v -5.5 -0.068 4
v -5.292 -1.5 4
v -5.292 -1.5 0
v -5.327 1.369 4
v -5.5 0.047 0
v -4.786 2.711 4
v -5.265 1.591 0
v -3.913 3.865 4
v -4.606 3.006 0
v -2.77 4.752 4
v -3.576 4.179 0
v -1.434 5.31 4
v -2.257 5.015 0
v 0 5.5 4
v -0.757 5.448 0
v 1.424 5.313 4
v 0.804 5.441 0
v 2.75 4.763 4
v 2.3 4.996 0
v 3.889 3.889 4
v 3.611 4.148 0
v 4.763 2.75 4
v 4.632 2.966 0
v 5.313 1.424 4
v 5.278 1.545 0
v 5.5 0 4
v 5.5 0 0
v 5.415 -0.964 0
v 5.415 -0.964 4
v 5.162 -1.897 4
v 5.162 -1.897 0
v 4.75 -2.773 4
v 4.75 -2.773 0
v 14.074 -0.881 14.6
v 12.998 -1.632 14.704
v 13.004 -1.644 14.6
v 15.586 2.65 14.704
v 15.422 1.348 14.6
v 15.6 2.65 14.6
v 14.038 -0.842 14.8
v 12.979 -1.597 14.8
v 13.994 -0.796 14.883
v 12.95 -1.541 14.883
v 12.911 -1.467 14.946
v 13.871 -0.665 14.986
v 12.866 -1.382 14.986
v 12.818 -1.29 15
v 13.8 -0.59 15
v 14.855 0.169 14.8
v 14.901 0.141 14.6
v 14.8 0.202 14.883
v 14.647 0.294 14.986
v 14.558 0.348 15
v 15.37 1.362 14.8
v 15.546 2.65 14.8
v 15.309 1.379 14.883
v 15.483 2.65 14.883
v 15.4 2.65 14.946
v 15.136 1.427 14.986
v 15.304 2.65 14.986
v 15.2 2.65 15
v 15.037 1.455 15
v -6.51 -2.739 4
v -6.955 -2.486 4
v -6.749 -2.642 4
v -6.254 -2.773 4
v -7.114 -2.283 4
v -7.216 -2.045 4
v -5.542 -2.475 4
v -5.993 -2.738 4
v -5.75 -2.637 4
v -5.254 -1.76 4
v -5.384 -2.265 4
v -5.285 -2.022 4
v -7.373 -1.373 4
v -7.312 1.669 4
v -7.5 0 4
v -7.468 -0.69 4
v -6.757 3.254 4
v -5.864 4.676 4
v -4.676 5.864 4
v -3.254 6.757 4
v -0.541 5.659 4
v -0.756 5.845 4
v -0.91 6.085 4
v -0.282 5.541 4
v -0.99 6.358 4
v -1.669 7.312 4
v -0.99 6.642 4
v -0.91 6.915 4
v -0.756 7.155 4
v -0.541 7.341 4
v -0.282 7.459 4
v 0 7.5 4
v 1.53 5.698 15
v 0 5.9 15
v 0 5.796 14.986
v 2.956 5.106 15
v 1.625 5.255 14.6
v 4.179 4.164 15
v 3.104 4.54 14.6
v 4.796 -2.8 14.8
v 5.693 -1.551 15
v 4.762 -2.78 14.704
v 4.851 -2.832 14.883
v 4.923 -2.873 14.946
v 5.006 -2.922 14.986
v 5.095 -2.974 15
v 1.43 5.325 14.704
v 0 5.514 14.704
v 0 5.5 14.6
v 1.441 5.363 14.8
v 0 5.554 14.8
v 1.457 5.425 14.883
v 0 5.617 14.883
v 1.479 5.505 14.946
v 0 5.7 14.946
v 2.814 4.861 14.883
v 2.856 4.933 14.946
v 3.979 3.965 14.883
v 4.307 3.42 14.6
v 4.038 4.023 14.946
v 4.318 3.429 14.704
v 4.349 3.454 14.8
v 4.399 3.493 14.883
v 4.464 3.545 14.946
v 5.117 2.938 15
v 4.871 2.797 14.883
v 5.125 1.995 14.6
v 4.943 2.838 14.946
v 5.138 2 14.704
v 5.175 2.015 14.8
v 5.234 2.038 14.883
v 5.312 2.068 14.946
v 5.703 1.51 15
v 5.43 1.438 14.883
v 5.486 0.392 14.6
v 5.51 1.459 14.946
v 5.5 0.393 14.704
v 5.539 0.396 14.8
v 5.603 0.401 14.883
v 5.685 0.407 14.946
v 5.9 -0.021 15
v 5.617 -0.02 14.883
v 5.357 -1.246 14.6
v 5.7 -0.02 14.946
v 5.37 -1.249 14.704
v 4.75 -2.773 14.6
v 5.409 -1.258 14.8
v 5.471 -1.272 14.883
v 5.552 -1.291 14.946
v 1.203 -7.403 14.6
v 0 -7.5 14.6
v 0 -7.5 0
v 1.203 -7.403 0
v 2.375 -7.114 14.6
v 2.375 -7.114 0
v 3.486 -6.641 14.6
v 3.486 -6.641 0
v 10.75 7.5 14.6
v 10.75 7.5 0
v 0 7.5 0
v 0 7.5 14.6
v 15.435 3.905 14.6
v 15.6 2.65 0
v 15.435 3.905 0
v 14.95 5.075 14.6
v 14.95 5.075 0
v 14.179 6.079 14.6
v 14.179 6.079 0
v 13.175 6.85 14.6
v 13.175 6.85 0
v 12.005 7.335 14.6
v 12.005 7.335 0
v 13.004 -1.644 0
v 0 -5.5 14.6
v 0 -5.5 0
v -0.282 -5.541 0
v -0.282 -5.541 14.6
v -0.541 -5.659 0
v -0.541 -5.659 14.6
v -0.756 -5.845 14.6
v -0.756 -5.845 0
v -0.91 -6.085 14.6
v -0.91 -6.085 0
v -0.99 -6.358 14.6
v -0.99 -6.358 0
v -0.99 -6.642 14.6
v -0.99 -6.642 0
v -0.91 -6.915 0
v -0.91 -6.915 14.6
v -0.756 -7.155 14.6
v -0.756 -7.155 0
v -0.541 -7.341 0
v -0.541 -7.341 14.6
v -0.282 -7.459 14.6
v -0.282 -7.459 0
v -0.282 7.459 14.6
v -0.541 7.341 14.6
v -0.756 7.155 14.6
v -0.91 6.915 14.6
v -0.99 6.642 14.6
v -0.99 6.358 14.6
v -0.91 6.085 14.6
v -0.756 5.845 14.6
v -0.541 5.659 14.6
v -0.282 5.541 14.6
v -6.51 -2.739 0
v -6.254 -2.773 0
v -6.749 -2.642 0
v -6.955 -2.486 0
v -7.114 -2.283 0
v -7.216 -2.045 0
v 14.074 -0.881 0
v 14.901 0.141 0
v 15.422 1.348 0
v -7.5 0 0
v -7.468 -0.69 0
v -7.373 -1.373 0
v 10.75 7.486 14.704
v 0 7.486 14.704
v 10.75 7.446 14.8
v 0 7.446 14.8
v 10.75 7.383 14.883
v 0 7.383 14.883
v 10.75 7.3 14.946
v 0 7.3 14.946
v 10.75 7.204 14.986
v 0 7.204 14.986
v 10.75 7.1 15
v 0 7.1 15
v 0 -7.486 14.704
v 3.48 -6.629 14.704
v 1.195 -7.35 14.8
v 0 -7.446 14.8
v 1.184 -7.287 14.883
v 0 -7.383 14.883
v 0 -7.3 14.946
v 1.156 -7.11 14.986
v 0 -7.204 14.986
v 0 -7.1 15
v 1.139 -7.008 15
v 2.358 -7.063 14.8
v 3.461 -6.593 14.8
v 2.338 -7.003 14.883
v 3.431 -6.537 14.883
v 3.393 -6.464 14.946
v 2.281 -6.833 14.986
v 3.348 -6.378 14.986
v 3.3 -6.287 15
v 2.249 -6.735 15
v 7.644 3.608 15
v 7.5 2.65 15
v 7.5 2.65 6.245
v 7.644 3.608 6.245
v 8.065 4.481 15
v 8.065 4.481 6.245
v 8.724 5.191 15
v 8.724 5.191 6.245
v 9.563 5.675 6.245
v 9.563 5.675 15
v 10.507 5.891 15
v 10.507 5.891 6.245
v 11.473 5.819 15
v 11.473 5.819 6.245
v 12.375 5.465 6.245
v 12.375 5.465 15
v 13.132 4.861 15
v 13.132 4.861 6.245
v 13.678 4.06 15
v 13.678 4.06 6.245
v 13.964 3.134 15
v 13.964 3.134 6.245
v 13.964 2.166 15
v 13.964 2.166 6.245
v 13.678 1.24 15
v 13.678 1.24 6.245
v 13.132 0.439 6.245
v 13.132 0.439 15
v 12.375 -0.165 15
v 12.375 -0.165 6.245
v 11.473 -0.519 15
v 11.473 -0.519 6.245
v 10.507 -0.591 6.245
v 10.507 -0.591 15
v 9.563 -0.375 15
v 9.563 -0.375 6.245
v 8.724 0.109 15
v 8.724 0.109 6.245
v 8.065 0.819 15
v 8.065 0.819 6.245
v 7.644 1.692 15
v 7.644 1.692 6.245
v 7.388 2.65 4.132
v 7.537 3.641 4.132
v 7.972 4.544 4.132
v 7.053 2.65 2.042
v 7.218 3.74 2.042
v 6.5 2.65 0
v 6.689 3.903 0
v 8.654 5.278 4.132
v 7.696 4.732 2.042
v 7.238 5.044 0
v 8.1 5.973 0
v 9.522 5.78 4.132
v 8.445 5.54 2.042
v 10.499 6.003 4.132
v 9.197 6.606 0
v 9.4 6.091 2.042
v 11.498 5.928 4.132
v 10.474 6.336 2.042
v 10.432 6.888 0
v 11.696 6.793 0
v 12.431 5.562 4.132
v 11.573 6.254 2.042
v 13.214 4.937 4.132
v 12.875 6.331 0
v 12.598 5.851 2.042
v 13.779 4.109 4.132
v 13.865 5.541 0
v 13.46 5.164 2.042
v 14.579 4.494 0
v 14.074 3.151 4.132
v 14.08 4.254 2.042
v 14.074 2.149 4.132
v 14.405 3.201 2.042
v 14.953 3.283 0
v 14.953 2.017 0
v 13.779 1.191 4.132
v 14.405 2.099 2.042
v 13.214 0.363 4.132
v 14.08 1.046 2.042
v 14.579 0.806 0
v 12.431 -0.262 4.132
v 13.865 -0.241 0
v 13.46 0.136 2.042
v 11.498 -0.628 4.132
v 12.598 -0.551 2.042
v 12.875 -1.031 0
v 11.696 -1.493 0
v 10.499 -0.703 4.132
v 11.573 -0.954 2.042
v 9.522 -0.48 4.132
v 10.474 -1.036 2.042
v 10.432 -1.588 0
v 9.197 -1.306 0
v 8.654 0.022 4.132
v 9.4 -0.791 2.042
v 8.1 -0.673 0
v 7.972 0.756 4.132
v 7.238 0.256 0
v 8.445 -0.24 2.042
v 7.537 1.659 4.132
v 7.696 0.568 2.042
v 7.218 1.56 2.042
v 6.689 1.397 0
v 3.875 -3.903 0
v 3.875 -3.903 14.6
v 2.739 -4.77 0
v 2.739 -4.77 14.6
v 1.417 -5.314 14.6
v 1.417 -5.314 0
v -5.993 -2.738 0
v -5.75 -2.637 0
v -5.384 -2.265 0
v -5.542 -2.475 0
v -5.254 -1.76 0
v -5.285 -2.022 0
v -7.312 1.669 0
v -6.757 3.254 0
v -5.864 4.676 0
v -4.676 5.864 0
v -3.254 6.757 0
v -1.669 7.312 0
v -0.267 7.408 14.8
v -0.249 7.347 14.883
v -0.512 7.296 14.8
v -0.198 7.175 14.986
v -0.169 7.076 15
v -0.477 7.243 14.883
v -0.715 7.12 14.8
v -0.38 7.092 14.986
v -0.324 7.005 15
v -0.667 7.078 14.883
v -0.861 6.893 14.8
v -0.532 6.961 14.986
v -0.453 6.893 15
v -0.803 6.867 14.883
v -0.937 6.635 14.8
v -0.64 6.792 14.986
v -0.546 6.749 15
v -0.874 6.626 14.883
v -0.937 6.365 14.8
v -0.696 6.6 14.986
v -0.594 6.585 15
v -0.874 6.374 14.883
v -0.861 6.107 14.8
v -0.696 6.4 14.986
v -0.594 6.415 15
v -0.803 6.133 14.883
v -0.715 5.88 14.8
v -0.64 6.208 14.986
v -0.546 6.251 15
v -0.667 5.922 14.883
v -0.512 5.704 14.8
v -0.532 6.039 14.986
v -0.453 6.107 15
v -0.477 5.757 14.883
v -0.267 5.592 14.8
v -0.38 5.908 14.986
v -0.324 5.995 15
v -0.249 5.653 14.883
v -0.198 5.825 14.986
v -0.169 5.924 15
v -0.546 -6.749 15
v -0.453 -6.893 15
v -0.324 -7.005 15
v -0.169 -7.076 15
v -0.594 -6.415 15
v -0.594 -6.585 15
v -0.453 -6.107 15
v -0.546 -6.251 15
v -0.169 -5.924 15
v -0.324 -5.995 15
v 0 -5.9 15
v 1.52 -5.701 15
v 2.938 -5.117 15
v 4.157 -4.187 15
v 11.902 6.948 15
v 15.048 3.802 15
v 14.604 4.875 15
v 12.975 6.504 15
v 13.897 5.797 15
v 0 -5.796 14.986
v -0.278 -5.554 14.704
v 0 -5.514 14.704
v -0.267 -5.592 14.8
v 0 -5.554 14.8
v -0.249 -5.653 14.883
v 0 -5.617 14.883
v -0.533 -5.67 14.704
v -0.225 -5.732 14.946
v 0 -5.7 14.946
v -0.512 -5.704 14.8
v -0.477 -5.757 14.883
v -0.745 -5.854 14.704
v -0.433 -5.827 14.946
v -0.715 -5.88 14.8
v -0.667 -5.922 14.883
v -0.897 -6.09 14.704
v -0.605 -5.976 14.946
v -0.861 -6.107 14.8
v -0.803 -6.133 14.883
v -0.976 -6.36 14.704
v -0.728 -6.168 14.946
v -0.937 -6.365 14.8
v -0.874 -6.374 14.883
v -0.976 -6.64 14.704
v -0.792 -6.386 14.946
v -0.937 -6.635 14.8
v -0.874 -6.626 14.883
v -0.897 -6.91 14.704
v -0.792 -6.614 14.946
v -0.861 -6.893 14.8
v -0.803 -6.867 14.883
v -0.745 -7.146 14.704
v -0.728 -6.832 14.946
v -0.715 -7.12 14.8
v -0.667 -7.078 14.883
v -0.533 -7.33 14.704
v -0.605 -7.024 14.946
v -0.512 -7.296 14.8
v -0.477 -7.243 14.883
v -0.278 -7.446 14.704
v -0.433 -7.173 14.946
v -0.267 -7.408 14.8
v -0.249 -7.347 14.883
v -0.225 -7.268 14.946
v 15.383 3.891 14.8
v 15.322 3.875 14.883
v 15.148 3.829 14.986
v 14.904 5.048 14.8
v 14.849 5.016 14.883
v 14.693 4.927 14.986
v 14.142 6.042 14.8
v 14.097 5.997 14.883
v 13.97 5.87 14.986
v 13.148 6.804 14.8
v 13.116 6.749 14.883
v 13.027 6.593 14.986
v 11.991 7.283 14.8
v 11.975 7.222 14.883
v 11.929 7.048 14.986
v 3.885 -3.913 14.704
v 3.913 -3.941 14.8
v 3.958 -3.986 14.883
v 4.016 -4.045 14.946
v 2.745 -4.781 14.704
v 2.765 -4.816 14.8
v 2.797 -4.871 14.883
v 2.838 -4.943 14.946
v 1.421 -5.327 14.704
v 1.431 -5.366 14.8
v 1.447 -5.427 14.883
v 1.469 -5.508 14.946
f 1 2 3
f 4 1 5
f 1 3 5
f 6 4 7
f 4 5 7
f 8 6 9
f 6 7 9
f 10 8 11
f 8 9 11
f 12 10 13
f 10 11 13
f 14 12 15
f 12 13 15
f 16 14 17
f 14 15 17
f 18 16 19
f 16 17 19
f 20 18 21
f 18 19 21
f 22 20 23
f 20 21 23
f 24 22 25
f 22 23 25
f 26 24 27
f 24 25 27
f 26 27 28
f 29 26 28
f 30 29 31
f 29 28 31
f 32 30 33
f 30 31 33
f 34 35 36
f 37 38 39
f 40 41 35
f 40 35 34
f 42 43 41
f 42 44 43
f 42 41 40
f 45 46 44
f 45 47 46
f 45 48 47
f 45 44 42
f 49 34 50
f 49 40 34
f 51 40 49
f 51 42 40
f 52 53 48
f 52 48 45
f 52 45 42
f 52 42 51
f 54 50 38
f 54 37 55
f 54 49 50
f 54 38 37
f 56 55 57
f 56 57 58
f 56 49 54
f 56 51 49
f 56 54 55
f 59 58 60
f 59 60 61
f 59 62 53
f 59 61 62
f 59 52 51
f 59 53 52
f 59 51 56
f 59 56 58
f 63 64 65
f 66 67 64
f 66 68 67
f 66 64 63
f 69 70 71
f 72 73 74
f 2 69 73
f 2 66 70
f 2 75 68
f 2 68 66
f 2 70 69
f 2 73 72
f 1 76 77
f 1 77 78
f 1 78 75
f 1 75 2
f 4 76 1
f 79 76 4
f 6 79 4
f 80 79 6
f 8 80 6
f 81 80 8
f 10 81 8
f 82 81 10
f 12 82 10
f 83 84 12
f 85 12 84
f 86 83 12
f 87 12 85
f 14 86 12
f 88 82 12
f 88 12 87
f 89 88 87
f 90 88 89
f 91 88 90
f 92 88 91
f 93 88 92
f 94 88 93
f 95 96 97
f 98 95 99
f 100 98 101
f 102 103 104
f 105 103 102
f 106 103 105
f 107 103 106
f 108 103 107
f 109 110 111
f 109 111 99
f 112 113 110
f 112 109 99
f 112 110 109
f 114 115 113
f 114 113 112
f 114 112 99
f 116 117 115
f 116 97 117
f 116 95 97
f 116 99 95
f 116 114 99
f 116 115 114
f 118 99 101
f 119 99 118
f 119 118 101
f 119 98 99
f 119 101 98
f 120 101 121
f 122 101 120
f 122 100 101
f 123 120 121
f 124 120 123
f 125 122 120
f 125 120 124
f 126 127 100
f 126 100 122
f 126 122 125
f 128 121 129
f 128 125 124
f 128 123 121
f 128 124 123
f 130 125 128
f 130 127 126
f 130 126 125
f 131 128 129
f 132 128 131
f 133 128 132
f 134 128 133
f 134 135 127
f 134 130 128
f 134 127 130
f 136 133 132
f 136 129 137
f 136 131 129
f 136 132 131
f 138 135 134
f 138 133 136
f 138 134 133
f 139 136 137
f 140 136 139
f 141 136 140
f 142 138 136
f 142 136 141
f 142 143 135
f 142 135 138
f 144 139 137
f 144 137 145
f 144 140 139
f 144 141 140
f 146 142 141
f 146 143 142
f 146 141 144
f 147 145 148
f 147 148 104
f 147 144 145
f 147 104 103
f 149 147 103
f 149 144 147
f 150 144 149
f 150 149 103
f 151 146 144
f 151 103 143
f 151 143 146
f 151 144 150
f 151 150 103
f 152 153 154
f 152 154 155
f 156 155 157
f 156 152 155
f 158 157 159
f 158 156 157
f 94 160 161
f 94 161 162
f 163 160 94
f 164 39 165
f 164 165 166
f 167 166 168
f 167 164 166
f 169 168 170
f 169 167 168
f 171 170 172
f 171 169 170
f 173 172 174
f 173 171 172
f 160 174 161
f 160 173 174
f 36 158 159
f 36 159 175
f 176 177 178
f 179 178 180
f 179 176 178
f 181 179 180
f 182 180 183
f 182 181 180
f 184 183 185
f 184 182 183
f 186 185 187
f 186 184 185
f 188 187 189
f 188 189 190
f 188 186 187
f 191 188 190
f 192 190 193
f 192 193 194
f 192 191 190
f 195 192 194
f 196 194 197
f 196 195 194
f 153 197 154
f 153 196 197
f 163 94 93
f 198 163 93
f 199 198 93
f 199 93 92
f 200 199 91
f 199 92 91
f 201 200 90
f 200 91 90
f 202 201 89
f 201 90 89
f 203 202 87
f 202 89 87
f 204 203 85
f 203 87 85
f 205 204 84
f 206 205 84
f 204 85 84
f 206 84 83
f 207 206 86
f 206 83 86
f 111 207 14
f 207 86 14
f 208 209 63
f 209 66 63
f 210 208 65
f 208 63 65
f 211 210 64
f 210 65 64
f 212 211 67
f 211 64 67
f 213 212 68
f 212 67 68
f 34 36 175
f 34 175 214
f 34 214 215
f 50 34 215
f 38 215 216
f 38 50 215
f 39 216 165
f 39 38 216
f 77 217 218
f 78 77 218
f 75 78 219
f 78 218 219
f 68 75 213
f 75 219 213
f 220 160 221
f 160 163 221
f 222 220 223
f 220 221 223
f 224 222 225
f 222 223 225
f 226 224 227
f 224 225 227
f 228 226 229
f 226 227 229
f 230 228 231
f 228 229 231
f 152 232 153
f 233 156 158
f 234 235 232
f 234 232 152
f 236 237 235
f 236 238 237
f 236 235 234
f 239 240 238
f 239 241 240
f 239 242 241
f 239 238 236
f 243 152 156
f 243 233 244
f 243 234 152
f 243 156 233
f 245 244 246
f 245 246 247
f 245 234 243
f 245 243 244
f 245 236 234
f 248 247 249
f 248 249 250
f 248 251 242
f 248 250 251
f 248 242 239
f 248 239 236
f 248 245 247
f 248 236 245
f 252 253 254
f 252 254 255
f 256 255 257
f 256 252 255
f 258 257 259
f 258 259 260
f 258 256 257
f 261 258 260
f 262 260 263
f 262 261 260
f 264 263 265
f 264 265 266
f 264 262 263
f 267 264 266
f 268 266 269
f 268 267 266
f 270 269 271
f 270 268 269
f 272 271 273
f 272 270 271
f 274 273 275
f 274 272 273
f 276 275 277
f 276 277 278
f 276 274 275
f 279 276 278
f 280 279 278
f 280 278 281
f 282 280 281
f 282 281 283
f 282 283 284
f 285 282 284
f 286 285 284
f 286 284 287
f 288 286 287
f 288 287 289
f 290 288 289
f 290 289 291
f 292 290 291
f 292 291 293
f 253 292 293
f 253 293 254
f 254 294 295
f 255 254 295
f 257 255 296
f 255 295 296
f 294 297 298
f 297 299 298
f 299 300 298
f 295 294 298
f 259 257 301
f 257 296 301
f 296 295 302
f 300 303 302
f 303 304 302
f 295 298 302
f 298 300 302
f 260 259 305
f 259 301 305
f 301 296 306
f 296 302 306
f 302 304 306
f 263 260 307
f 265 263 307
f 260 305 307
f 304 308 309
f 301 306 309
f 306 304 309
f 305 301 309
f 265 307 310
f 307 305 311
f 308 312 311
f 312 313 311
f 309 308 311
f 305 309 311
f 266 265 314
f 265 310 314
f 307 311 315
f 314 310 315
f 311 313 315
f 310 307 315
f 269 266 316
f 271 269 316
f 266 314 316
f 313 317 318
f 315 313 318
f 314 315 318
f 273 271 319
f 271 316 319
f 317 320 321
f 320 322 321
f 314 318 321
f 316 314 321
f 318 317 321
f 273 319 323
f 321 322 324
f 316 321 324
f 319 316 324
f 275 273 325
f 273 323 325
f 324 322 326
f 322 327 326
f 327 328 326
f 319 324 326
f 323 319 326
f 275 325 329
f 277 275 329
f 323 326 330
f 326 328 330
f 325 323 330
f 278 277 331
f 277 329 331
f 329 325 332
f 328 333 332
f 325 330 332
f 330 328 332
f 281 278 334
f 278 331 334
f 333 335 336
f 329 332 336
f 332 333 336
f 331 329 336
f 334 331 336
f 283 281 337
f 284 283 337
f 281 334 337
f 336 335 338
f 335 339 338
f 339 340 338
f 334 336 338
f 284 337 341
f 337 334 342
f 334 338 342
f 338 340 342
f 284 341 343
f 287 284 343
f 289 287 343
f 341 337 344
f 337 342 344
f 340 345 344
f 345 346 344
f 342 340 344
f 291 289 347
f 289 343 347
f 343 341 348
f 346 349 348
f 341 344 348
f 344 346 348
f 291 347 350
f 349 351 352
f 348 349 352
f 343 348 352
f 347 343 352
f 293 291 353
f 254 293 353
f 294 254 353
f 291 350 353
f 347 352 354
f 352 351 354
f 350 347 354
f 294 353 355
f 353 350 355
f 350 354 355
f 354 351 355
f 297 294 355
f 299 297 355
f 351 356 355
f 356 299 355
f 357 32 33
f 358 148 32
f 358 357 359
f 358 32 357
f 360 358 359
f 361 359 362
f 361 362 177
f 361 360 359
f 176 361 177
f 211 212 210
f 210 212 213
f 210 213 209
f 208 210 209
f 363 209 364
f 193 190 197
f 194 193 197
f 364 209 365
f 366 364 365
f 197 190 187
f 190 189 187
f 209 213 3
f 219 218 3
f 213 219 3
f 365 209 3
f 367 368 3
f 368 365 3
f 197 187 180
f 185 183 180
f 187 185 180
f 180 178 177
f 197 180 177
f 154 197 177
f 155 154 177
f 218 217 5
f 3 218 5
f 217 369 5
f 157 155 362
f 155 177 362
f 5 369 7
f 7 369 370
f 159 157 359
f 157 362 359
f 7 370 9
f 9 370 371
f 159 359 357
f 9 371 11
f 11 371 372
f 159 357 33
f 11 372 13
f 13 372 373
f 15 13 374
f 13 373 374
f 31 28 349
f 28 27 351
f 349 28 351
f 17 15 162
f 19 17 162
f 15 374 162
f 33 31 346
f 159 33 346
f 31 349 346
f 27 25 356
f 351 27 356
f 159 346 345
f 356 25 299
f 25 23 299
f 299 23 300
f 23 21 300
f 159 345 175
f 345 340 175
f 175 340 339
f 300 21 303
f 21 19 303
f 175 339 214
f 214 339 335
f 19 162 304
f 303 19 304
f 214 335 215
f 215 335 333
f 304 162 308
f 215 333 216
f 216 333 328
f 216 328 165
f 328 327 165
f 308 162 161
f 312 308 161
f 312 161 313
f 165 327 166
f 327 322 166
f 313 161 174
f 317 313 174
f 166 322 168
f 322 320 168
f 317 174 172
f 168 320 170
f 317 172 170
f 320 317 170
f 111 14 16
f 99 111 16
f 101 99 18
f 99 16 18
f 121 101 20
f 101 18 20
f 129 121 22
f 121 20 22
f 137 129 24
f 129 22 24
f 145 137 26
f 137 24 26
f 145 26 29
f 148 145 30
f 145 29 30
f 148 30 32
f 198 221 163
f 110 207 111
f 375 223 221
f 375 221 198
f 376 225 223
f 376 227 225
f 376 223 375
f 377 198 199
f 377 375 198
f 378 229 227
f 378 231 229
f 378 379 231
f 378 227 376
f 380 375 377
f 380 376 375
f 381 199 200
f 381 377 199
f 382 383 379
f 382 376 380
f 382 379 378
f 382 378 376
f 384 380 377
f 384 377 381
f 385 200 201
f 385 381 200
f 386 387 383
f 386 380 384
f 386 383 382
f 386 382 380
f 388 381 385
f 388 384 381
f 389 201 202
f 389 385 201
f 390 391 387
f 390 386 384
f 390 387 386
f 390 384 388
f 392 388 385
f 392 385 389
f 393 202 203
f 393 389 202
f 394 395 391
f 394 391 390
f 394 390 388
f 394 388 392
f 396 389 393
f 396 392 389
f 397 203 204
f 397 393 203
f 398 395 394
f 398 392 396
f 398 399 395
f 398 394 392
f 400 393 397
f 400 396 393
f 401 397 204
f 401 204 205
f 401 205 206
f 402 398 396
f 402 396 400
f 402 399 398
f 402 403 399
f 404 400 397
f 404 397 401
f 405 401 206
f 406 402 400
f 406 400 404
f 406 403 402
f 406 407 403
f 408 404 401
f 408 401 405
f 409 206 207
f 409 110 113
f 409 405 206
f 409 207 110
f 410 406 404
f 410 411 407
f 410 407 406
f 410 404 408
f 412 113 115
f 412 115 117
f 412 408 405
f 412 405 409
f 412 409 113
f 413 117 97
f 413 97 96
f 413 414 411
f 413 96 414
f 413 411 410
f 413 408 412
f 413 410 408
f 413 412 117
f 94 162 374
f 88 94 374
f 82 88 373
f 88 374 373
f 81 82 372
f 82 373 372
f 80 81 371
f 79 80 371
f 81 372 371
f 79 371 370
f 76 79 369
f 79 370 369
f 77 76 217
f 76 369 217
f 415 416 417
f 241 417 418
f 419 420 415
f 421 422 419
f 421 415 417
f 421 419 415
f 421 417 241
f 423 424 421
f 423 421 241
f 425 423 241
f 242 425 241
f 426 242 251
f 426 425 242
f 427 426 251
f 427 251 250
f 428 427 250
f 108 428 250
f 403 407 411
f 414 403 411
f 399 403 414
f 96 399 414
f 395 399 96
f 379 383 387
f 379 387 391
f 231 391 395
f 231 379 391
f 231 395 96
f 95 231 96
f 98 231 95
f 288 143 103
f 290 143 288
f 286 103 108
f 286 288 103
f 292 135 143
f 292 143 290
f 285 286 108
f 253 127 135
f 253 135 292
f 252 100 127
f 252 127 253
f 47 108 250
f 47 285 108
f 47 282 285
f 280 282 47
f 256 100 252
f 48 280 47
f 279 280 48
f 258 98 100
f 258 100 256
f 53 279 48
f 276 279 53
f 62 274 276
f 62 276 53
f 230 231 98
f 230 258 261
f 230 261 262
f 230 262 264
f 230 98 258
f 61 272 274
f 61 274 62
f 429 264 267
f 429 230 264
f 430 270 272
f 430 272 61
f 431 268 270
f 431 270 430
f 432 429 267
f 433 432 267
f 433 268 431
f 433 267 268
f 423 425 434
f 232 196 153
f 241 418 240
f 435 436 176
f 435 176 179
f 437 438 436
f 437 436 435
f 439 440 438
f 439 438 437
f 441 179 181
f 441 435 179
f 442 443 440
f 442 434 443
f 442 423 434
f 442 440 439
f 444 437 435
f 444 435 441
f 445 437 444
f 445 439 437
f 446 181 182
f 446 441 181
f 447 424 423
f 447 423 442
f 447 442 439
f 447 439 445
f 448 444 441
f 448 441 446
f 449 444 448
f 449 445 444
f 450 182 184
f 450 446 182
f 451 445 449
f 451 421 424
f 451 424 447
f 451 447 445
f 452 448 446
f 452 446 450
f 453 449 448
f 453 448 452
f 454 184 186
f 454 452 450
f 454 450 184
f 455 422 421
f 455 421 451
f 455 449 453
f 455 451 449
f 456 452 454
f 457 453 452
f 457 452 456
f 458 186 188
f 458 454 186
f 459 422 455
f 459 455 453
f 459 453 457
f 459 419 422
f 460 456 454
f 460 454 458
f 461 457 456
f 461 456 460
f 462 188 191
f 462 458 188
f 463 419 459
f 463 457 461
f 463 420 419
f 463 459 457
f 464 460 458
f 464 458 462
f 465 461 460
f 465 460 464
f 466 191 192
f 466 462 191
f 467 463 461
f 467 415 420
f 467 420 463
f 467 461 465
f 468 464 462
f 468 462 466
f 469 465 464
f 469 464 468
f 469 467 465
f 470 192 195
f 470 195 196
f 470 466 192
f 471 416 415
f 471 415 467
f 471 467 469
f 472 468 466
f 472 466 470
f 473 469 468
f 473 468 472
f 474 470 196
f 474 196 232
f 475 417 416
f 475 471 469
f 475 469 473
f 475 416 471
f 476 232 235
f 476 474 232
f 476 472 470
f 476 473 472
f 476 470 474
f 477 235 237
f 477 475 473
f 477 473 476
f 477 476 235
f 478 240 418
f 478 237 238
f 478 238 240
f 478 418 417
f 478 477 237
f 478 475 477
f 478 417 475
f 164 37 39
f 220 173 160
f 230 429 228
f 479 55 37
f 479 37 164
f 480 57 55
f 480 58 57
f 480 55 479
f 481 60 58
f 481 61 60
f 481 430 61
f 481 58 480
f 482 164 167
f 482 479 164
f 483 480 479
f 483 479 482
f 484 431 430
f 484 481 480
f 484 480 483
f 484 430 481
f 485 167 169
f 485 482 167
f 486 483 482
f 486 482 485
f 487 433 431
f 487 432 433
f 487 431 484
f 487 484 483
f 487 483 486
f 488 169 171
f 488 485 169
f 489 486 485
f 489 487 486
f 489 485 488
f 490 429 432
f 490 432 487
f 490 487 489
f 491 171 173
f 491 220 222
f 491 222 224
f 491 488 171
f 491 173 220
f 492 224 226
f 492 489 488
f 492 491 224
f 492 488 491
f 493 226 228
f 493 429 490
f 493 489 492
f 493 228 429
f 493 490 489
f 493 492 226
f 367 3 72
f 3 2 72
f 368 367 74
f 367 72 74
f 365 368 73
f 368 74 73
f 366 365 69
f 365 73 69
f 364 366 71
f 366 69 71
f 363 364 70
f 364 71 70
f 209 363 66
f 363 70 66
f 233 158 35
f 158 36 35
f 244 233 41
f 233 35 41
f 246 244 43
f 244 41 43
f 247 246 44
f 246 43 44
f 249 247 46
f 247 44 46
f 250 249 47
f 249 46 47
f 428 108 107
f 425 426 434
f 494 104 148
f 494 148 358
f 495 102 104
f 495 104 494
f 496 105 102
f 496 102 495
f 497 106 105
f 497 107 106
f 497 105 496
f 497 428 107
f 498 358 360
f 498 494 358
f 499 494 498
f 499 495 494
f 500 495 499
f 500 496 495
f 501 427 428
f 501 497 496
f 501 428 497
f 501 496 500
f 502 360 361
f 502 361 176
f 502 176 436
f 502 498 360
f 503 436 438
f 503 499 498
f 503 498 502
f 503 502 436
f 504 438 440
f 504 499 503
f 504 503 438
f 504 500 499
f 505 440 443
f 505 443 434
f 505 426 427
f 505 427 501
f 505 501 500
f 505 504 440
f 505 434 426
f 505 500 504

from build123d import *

# Parameters (mm, degrees)
F1_DEPTH = 4
F2_R     = 1
F3_DEPTH = 11
F5_DEPTH = 15
F6_R     = 0.99999
F7_R     = 0.4


# Not quite as in the source:
# - a fillet or chamfer that OpenCascade refuses, or shapes differently, is made with other operations: its cross-section is extruded or revolved along the edge and cut away or added
# - a fillet or chamfer is up to 0.001 mm smaller than in the source, because OpenCascade refuses the exact size
# - a feature names something its author has since deleted; it is built from what else it names


with BuildPart() as f1:
    # F0 (on Top) → F1 (new body)
    with BuildSketch(Plane.XY):
        with BuildLine():
            ThreePointArc((-4.75, -2.7726341266), (-1.4361406616, 5.3091901454), (5.5, 0))
            ThreePointArc((5.5, 0), (5.3091901454, -1.4361406616), (4.75, -2.7726341266))
            Line((4.75, -2.7726341266), (6.9686799324, -2.7726341266))
            ThreePointArc((6.9686799324, -2.7726341266), (7.3659724237, -1.4115418001), (7.5, 0))
            ThreePointArc((7.5, 0), (5.3033008589, 5.3033008589), (0, 7.5))
            ThreePointArc((0, 7.5), (-5.3033008589, 5.3033008589), (-7.5, 0))
            ThreePointArc((-7.5, 0), (-7.3659724237, -1.4115418001), (-6.9686799324, -2.7726341266))
            Line((-6.9686799324, -2.7726341266), (-4.75, -2.7726341266))
        make_face()
        with BuildLine():
            ThreePointArc((0, 7.5), (5.3033008589, 5.3033008589), (7.5, 0))
            Line((7.5, 0), (7.5, 7.5))
            Line((7.5, 7.5), (0, 7.5))
        make_face()
    extrude(amount=F1_DEPTH)

    # F2 (on face) → F3 (join)
    with BuildSketch(Plane.XY.offset(4)):
        with Locations((0, 6.5)):
            Circle(F2_R)
        with BuildLine():
            ThreePointArc((0, 7.5), (0.7071067812, 7.2071067812), (1, 6.5))
            ThreePointArc((1, 6.5), (0.7071067812, 5.7928932188), (0, 5.5))
            ThreePointArc((0, 5.5), (4.769669155, 2.7386595538), (4.75, -2.7726341266))
            Line((4.75, -2.7726341266), (6.9686799324, -2.7726341266))
            ThreePointArc((6.9686799324, -2.7726341266), (7.3659724237, -1.4115418001), (7.5, 0))
            Line((7.5, 0), (7.5, 7.5))
            Line((7.5, 7.5), (0, 7.5))
        make_face()
    extrude(amount=F3_DEPTH)

    # F4 (on face) → F5 (join, through all)
    with BuildSketch(Plane.XY.offset(15)):
        with BuildLine():
            Line((7.5, 6.25), (7.5, 2.65))
            Line((7.5, 2.65), (7.5, 0))
            ThreePointArc((7.5, 0), (7.4864300086, -0.4509608915), (7.4457691398, -0.9002899069))
            ThreePointArc((7.4457691398, -0.9002899069), (10.1065360675, -2.1571253539), (13.0041807725, -1.6443182282))
            ThreePointArc((13.0041807725, -1.6443182282), (14.900619035, 0.1410437177), (15.6, 2.65))
            ThreePointArc((15.6, 2.65), (14.1794678888, 6.0794678888), (10.75, 7.5))
            ThreePointArc((10.75, 7.5), (9.0089514654, 7.1767261901), (7.5, 6.25))
        make_face()
        with BuildLine():
            ThreePointArc((7.5, 2.65), (10.75, 5.9), (14, 2.65))
            ThreePointArc((14, 2.65), (10.75, -0.6), (7.5, 2.65))
        make_face(mode=Mode.SUBTRACT)
        with BuildLine():
            Line((7.5, 0), (7.5, 2.65))
            Line((7.5, 2.65), (7.5, 6.25))
            ThreePointArc((7.5, 6.25), (6.712321746, 5.3369414428), (6.1742445242, 4.2577816473))
            ThreePointArc((6.1742445242, 4.2577816473), (7.1608949836, 2.2297046967), (7.5, 0))
        make_face()
        with BuildLine():
            ThreePointArc((7.4457691398, -0.9002899069), (7.4864300086, -0.4509608915), (7.5, 0))
            ThreePointArc((7.5, 0), (7.1608949836, 2.2297046967), (6.1742445242, 4.2577816473))
            ThreePointArc((6.1742445242, 4.2577816473), (6.0409691333, 1.4891691352), (7.4457691398, -0.9002899069))
        make_face()
        with BuildLine():
            Line((7.5, 7.5), (7.5, 6.25))
            ThreePointArc((7.5, 6.25), (9.0089514654, 7.1767261901), (10.75, 7.5))
            Line((10.75, 7.5), (7.5, 7.5))
        make_face()
        with BuildLine():
            ThreePointArc((13.0041807725, -1.6443182282), (10.1065360675, -2.1571253539), (7.4457691398, -0.9002899069))
            ThreePointArc((7.4457691398, -0.9002899069), (7.2677715796, -1.8518899176), (6.9686799324, -2.7726341266))
            ThreePointArc((6.9686799324, -2.7726341266), (5.5735770486, -5.0184897015), (3.4858465555, -6.640698291))
            Line((3.4858465555, -6.640698291), (13.0041807725, -1.6443182282))
        make_face()
        with BuildLine():
            ThreePointArc((3.4858465555, -6.640698291), (5.5735770486, -5.0184897015), (6.9686799324, -2.7726341266))
            Line((6.9686799324, -2.7726341266), (4.75, -2.7726341266))
            ThreePointArc((4.75, -2.7726341266), (2.7386595462, -4.7696691594), (-1.76e-08, -5.5))
            ThreePointArc((-1.76e-08, -5.5), (0.707106775, -5.7928932126), (1, -6.5))
            ThreePointArc((1, -6.5), (0.7071067812, -7.2071067812), (0, -7.5))
            ThreePointArc((0, -7.5), (1.7950992755, -7.2820064949), (3.4858465555, -6.640698291))
        make_face()
        with BuildLine():
            ThreePointArc((-1.76e-08, -5.5), (-1, -6.5000000088), (0, -7.5))
            ThreePointArc((0, -7.5), (0.7071067812, -7.2071067812), (1, -6.5))
            ThreePointArc((1, -6.5), (0.707106775, -5.7928932126), (-1.76e-08, -5.5))
        make_face()
    extrude(amount=-F5_DEPTH)

    # F6 (radius 1 in the source; OpenCascade refuses exactly that, so slightly less here)
    f6_edges = [f1.edges().sort_by_distance(p)[0] for p in [
        (-6.96868, -2.772634, 2),
        (-4.75, -2.772634, 2),
    ]]
    fillet(f6_edges, radius=F6_R)

    # F7
    f7_edges = [f1.edges().sort_by_distance(p)[0] for p in [
        (8.245014, -4.142508, 15),
        (3.75, 7.5, 15),
        (4.769669, 2.73866, 15),
        (-1, 6.5, 15),
        (9.125, 7.5, 15),
        (15.459031, 3.810831, 15),
        (1.795099, -7.282006, 15),
        (-1, -6.5, 15),
        (2.73866, -4.769669, 15),
    ]]
    fillet(f7_edges, radius=F7_R)

    # F8: chamfer of 1 on 1 edges, made by hand

    # F8_s1 → F8_t2 (revolve, cut)
    with BuildSketch(Plane.XZ.offset(-2.65)):
        Polygon((6.5, 0), (7.5, 1), (7.5, 0), align=None)
    revolve(axis=Axis((10.75, 2.65, 0), (0, 0, -1)), mode=Mode.SUBTRACT)

    # F9: fillet of radius 20 on 1 edges, made by hand

    # F9_s1 → F9_t2 (revolve, cut)
    with BuildSketch(Plane.XZ.offset(-2.65)):
        with BuildLine():
            ThreePointArc((7.5, 6.2449979984), (7.2484176581, 3.0827203382), (6.5, 0))
            Line((6.5, 0), (7.5, 1))
            Line((7.5, 1), (7.5, 6.2449979984))
        make_face()
    revolve(axis=Axis((10.75, 2.65, 1), (0, 0, -1)), mode=Mode.SUBTRACT)


solid = f1.part
